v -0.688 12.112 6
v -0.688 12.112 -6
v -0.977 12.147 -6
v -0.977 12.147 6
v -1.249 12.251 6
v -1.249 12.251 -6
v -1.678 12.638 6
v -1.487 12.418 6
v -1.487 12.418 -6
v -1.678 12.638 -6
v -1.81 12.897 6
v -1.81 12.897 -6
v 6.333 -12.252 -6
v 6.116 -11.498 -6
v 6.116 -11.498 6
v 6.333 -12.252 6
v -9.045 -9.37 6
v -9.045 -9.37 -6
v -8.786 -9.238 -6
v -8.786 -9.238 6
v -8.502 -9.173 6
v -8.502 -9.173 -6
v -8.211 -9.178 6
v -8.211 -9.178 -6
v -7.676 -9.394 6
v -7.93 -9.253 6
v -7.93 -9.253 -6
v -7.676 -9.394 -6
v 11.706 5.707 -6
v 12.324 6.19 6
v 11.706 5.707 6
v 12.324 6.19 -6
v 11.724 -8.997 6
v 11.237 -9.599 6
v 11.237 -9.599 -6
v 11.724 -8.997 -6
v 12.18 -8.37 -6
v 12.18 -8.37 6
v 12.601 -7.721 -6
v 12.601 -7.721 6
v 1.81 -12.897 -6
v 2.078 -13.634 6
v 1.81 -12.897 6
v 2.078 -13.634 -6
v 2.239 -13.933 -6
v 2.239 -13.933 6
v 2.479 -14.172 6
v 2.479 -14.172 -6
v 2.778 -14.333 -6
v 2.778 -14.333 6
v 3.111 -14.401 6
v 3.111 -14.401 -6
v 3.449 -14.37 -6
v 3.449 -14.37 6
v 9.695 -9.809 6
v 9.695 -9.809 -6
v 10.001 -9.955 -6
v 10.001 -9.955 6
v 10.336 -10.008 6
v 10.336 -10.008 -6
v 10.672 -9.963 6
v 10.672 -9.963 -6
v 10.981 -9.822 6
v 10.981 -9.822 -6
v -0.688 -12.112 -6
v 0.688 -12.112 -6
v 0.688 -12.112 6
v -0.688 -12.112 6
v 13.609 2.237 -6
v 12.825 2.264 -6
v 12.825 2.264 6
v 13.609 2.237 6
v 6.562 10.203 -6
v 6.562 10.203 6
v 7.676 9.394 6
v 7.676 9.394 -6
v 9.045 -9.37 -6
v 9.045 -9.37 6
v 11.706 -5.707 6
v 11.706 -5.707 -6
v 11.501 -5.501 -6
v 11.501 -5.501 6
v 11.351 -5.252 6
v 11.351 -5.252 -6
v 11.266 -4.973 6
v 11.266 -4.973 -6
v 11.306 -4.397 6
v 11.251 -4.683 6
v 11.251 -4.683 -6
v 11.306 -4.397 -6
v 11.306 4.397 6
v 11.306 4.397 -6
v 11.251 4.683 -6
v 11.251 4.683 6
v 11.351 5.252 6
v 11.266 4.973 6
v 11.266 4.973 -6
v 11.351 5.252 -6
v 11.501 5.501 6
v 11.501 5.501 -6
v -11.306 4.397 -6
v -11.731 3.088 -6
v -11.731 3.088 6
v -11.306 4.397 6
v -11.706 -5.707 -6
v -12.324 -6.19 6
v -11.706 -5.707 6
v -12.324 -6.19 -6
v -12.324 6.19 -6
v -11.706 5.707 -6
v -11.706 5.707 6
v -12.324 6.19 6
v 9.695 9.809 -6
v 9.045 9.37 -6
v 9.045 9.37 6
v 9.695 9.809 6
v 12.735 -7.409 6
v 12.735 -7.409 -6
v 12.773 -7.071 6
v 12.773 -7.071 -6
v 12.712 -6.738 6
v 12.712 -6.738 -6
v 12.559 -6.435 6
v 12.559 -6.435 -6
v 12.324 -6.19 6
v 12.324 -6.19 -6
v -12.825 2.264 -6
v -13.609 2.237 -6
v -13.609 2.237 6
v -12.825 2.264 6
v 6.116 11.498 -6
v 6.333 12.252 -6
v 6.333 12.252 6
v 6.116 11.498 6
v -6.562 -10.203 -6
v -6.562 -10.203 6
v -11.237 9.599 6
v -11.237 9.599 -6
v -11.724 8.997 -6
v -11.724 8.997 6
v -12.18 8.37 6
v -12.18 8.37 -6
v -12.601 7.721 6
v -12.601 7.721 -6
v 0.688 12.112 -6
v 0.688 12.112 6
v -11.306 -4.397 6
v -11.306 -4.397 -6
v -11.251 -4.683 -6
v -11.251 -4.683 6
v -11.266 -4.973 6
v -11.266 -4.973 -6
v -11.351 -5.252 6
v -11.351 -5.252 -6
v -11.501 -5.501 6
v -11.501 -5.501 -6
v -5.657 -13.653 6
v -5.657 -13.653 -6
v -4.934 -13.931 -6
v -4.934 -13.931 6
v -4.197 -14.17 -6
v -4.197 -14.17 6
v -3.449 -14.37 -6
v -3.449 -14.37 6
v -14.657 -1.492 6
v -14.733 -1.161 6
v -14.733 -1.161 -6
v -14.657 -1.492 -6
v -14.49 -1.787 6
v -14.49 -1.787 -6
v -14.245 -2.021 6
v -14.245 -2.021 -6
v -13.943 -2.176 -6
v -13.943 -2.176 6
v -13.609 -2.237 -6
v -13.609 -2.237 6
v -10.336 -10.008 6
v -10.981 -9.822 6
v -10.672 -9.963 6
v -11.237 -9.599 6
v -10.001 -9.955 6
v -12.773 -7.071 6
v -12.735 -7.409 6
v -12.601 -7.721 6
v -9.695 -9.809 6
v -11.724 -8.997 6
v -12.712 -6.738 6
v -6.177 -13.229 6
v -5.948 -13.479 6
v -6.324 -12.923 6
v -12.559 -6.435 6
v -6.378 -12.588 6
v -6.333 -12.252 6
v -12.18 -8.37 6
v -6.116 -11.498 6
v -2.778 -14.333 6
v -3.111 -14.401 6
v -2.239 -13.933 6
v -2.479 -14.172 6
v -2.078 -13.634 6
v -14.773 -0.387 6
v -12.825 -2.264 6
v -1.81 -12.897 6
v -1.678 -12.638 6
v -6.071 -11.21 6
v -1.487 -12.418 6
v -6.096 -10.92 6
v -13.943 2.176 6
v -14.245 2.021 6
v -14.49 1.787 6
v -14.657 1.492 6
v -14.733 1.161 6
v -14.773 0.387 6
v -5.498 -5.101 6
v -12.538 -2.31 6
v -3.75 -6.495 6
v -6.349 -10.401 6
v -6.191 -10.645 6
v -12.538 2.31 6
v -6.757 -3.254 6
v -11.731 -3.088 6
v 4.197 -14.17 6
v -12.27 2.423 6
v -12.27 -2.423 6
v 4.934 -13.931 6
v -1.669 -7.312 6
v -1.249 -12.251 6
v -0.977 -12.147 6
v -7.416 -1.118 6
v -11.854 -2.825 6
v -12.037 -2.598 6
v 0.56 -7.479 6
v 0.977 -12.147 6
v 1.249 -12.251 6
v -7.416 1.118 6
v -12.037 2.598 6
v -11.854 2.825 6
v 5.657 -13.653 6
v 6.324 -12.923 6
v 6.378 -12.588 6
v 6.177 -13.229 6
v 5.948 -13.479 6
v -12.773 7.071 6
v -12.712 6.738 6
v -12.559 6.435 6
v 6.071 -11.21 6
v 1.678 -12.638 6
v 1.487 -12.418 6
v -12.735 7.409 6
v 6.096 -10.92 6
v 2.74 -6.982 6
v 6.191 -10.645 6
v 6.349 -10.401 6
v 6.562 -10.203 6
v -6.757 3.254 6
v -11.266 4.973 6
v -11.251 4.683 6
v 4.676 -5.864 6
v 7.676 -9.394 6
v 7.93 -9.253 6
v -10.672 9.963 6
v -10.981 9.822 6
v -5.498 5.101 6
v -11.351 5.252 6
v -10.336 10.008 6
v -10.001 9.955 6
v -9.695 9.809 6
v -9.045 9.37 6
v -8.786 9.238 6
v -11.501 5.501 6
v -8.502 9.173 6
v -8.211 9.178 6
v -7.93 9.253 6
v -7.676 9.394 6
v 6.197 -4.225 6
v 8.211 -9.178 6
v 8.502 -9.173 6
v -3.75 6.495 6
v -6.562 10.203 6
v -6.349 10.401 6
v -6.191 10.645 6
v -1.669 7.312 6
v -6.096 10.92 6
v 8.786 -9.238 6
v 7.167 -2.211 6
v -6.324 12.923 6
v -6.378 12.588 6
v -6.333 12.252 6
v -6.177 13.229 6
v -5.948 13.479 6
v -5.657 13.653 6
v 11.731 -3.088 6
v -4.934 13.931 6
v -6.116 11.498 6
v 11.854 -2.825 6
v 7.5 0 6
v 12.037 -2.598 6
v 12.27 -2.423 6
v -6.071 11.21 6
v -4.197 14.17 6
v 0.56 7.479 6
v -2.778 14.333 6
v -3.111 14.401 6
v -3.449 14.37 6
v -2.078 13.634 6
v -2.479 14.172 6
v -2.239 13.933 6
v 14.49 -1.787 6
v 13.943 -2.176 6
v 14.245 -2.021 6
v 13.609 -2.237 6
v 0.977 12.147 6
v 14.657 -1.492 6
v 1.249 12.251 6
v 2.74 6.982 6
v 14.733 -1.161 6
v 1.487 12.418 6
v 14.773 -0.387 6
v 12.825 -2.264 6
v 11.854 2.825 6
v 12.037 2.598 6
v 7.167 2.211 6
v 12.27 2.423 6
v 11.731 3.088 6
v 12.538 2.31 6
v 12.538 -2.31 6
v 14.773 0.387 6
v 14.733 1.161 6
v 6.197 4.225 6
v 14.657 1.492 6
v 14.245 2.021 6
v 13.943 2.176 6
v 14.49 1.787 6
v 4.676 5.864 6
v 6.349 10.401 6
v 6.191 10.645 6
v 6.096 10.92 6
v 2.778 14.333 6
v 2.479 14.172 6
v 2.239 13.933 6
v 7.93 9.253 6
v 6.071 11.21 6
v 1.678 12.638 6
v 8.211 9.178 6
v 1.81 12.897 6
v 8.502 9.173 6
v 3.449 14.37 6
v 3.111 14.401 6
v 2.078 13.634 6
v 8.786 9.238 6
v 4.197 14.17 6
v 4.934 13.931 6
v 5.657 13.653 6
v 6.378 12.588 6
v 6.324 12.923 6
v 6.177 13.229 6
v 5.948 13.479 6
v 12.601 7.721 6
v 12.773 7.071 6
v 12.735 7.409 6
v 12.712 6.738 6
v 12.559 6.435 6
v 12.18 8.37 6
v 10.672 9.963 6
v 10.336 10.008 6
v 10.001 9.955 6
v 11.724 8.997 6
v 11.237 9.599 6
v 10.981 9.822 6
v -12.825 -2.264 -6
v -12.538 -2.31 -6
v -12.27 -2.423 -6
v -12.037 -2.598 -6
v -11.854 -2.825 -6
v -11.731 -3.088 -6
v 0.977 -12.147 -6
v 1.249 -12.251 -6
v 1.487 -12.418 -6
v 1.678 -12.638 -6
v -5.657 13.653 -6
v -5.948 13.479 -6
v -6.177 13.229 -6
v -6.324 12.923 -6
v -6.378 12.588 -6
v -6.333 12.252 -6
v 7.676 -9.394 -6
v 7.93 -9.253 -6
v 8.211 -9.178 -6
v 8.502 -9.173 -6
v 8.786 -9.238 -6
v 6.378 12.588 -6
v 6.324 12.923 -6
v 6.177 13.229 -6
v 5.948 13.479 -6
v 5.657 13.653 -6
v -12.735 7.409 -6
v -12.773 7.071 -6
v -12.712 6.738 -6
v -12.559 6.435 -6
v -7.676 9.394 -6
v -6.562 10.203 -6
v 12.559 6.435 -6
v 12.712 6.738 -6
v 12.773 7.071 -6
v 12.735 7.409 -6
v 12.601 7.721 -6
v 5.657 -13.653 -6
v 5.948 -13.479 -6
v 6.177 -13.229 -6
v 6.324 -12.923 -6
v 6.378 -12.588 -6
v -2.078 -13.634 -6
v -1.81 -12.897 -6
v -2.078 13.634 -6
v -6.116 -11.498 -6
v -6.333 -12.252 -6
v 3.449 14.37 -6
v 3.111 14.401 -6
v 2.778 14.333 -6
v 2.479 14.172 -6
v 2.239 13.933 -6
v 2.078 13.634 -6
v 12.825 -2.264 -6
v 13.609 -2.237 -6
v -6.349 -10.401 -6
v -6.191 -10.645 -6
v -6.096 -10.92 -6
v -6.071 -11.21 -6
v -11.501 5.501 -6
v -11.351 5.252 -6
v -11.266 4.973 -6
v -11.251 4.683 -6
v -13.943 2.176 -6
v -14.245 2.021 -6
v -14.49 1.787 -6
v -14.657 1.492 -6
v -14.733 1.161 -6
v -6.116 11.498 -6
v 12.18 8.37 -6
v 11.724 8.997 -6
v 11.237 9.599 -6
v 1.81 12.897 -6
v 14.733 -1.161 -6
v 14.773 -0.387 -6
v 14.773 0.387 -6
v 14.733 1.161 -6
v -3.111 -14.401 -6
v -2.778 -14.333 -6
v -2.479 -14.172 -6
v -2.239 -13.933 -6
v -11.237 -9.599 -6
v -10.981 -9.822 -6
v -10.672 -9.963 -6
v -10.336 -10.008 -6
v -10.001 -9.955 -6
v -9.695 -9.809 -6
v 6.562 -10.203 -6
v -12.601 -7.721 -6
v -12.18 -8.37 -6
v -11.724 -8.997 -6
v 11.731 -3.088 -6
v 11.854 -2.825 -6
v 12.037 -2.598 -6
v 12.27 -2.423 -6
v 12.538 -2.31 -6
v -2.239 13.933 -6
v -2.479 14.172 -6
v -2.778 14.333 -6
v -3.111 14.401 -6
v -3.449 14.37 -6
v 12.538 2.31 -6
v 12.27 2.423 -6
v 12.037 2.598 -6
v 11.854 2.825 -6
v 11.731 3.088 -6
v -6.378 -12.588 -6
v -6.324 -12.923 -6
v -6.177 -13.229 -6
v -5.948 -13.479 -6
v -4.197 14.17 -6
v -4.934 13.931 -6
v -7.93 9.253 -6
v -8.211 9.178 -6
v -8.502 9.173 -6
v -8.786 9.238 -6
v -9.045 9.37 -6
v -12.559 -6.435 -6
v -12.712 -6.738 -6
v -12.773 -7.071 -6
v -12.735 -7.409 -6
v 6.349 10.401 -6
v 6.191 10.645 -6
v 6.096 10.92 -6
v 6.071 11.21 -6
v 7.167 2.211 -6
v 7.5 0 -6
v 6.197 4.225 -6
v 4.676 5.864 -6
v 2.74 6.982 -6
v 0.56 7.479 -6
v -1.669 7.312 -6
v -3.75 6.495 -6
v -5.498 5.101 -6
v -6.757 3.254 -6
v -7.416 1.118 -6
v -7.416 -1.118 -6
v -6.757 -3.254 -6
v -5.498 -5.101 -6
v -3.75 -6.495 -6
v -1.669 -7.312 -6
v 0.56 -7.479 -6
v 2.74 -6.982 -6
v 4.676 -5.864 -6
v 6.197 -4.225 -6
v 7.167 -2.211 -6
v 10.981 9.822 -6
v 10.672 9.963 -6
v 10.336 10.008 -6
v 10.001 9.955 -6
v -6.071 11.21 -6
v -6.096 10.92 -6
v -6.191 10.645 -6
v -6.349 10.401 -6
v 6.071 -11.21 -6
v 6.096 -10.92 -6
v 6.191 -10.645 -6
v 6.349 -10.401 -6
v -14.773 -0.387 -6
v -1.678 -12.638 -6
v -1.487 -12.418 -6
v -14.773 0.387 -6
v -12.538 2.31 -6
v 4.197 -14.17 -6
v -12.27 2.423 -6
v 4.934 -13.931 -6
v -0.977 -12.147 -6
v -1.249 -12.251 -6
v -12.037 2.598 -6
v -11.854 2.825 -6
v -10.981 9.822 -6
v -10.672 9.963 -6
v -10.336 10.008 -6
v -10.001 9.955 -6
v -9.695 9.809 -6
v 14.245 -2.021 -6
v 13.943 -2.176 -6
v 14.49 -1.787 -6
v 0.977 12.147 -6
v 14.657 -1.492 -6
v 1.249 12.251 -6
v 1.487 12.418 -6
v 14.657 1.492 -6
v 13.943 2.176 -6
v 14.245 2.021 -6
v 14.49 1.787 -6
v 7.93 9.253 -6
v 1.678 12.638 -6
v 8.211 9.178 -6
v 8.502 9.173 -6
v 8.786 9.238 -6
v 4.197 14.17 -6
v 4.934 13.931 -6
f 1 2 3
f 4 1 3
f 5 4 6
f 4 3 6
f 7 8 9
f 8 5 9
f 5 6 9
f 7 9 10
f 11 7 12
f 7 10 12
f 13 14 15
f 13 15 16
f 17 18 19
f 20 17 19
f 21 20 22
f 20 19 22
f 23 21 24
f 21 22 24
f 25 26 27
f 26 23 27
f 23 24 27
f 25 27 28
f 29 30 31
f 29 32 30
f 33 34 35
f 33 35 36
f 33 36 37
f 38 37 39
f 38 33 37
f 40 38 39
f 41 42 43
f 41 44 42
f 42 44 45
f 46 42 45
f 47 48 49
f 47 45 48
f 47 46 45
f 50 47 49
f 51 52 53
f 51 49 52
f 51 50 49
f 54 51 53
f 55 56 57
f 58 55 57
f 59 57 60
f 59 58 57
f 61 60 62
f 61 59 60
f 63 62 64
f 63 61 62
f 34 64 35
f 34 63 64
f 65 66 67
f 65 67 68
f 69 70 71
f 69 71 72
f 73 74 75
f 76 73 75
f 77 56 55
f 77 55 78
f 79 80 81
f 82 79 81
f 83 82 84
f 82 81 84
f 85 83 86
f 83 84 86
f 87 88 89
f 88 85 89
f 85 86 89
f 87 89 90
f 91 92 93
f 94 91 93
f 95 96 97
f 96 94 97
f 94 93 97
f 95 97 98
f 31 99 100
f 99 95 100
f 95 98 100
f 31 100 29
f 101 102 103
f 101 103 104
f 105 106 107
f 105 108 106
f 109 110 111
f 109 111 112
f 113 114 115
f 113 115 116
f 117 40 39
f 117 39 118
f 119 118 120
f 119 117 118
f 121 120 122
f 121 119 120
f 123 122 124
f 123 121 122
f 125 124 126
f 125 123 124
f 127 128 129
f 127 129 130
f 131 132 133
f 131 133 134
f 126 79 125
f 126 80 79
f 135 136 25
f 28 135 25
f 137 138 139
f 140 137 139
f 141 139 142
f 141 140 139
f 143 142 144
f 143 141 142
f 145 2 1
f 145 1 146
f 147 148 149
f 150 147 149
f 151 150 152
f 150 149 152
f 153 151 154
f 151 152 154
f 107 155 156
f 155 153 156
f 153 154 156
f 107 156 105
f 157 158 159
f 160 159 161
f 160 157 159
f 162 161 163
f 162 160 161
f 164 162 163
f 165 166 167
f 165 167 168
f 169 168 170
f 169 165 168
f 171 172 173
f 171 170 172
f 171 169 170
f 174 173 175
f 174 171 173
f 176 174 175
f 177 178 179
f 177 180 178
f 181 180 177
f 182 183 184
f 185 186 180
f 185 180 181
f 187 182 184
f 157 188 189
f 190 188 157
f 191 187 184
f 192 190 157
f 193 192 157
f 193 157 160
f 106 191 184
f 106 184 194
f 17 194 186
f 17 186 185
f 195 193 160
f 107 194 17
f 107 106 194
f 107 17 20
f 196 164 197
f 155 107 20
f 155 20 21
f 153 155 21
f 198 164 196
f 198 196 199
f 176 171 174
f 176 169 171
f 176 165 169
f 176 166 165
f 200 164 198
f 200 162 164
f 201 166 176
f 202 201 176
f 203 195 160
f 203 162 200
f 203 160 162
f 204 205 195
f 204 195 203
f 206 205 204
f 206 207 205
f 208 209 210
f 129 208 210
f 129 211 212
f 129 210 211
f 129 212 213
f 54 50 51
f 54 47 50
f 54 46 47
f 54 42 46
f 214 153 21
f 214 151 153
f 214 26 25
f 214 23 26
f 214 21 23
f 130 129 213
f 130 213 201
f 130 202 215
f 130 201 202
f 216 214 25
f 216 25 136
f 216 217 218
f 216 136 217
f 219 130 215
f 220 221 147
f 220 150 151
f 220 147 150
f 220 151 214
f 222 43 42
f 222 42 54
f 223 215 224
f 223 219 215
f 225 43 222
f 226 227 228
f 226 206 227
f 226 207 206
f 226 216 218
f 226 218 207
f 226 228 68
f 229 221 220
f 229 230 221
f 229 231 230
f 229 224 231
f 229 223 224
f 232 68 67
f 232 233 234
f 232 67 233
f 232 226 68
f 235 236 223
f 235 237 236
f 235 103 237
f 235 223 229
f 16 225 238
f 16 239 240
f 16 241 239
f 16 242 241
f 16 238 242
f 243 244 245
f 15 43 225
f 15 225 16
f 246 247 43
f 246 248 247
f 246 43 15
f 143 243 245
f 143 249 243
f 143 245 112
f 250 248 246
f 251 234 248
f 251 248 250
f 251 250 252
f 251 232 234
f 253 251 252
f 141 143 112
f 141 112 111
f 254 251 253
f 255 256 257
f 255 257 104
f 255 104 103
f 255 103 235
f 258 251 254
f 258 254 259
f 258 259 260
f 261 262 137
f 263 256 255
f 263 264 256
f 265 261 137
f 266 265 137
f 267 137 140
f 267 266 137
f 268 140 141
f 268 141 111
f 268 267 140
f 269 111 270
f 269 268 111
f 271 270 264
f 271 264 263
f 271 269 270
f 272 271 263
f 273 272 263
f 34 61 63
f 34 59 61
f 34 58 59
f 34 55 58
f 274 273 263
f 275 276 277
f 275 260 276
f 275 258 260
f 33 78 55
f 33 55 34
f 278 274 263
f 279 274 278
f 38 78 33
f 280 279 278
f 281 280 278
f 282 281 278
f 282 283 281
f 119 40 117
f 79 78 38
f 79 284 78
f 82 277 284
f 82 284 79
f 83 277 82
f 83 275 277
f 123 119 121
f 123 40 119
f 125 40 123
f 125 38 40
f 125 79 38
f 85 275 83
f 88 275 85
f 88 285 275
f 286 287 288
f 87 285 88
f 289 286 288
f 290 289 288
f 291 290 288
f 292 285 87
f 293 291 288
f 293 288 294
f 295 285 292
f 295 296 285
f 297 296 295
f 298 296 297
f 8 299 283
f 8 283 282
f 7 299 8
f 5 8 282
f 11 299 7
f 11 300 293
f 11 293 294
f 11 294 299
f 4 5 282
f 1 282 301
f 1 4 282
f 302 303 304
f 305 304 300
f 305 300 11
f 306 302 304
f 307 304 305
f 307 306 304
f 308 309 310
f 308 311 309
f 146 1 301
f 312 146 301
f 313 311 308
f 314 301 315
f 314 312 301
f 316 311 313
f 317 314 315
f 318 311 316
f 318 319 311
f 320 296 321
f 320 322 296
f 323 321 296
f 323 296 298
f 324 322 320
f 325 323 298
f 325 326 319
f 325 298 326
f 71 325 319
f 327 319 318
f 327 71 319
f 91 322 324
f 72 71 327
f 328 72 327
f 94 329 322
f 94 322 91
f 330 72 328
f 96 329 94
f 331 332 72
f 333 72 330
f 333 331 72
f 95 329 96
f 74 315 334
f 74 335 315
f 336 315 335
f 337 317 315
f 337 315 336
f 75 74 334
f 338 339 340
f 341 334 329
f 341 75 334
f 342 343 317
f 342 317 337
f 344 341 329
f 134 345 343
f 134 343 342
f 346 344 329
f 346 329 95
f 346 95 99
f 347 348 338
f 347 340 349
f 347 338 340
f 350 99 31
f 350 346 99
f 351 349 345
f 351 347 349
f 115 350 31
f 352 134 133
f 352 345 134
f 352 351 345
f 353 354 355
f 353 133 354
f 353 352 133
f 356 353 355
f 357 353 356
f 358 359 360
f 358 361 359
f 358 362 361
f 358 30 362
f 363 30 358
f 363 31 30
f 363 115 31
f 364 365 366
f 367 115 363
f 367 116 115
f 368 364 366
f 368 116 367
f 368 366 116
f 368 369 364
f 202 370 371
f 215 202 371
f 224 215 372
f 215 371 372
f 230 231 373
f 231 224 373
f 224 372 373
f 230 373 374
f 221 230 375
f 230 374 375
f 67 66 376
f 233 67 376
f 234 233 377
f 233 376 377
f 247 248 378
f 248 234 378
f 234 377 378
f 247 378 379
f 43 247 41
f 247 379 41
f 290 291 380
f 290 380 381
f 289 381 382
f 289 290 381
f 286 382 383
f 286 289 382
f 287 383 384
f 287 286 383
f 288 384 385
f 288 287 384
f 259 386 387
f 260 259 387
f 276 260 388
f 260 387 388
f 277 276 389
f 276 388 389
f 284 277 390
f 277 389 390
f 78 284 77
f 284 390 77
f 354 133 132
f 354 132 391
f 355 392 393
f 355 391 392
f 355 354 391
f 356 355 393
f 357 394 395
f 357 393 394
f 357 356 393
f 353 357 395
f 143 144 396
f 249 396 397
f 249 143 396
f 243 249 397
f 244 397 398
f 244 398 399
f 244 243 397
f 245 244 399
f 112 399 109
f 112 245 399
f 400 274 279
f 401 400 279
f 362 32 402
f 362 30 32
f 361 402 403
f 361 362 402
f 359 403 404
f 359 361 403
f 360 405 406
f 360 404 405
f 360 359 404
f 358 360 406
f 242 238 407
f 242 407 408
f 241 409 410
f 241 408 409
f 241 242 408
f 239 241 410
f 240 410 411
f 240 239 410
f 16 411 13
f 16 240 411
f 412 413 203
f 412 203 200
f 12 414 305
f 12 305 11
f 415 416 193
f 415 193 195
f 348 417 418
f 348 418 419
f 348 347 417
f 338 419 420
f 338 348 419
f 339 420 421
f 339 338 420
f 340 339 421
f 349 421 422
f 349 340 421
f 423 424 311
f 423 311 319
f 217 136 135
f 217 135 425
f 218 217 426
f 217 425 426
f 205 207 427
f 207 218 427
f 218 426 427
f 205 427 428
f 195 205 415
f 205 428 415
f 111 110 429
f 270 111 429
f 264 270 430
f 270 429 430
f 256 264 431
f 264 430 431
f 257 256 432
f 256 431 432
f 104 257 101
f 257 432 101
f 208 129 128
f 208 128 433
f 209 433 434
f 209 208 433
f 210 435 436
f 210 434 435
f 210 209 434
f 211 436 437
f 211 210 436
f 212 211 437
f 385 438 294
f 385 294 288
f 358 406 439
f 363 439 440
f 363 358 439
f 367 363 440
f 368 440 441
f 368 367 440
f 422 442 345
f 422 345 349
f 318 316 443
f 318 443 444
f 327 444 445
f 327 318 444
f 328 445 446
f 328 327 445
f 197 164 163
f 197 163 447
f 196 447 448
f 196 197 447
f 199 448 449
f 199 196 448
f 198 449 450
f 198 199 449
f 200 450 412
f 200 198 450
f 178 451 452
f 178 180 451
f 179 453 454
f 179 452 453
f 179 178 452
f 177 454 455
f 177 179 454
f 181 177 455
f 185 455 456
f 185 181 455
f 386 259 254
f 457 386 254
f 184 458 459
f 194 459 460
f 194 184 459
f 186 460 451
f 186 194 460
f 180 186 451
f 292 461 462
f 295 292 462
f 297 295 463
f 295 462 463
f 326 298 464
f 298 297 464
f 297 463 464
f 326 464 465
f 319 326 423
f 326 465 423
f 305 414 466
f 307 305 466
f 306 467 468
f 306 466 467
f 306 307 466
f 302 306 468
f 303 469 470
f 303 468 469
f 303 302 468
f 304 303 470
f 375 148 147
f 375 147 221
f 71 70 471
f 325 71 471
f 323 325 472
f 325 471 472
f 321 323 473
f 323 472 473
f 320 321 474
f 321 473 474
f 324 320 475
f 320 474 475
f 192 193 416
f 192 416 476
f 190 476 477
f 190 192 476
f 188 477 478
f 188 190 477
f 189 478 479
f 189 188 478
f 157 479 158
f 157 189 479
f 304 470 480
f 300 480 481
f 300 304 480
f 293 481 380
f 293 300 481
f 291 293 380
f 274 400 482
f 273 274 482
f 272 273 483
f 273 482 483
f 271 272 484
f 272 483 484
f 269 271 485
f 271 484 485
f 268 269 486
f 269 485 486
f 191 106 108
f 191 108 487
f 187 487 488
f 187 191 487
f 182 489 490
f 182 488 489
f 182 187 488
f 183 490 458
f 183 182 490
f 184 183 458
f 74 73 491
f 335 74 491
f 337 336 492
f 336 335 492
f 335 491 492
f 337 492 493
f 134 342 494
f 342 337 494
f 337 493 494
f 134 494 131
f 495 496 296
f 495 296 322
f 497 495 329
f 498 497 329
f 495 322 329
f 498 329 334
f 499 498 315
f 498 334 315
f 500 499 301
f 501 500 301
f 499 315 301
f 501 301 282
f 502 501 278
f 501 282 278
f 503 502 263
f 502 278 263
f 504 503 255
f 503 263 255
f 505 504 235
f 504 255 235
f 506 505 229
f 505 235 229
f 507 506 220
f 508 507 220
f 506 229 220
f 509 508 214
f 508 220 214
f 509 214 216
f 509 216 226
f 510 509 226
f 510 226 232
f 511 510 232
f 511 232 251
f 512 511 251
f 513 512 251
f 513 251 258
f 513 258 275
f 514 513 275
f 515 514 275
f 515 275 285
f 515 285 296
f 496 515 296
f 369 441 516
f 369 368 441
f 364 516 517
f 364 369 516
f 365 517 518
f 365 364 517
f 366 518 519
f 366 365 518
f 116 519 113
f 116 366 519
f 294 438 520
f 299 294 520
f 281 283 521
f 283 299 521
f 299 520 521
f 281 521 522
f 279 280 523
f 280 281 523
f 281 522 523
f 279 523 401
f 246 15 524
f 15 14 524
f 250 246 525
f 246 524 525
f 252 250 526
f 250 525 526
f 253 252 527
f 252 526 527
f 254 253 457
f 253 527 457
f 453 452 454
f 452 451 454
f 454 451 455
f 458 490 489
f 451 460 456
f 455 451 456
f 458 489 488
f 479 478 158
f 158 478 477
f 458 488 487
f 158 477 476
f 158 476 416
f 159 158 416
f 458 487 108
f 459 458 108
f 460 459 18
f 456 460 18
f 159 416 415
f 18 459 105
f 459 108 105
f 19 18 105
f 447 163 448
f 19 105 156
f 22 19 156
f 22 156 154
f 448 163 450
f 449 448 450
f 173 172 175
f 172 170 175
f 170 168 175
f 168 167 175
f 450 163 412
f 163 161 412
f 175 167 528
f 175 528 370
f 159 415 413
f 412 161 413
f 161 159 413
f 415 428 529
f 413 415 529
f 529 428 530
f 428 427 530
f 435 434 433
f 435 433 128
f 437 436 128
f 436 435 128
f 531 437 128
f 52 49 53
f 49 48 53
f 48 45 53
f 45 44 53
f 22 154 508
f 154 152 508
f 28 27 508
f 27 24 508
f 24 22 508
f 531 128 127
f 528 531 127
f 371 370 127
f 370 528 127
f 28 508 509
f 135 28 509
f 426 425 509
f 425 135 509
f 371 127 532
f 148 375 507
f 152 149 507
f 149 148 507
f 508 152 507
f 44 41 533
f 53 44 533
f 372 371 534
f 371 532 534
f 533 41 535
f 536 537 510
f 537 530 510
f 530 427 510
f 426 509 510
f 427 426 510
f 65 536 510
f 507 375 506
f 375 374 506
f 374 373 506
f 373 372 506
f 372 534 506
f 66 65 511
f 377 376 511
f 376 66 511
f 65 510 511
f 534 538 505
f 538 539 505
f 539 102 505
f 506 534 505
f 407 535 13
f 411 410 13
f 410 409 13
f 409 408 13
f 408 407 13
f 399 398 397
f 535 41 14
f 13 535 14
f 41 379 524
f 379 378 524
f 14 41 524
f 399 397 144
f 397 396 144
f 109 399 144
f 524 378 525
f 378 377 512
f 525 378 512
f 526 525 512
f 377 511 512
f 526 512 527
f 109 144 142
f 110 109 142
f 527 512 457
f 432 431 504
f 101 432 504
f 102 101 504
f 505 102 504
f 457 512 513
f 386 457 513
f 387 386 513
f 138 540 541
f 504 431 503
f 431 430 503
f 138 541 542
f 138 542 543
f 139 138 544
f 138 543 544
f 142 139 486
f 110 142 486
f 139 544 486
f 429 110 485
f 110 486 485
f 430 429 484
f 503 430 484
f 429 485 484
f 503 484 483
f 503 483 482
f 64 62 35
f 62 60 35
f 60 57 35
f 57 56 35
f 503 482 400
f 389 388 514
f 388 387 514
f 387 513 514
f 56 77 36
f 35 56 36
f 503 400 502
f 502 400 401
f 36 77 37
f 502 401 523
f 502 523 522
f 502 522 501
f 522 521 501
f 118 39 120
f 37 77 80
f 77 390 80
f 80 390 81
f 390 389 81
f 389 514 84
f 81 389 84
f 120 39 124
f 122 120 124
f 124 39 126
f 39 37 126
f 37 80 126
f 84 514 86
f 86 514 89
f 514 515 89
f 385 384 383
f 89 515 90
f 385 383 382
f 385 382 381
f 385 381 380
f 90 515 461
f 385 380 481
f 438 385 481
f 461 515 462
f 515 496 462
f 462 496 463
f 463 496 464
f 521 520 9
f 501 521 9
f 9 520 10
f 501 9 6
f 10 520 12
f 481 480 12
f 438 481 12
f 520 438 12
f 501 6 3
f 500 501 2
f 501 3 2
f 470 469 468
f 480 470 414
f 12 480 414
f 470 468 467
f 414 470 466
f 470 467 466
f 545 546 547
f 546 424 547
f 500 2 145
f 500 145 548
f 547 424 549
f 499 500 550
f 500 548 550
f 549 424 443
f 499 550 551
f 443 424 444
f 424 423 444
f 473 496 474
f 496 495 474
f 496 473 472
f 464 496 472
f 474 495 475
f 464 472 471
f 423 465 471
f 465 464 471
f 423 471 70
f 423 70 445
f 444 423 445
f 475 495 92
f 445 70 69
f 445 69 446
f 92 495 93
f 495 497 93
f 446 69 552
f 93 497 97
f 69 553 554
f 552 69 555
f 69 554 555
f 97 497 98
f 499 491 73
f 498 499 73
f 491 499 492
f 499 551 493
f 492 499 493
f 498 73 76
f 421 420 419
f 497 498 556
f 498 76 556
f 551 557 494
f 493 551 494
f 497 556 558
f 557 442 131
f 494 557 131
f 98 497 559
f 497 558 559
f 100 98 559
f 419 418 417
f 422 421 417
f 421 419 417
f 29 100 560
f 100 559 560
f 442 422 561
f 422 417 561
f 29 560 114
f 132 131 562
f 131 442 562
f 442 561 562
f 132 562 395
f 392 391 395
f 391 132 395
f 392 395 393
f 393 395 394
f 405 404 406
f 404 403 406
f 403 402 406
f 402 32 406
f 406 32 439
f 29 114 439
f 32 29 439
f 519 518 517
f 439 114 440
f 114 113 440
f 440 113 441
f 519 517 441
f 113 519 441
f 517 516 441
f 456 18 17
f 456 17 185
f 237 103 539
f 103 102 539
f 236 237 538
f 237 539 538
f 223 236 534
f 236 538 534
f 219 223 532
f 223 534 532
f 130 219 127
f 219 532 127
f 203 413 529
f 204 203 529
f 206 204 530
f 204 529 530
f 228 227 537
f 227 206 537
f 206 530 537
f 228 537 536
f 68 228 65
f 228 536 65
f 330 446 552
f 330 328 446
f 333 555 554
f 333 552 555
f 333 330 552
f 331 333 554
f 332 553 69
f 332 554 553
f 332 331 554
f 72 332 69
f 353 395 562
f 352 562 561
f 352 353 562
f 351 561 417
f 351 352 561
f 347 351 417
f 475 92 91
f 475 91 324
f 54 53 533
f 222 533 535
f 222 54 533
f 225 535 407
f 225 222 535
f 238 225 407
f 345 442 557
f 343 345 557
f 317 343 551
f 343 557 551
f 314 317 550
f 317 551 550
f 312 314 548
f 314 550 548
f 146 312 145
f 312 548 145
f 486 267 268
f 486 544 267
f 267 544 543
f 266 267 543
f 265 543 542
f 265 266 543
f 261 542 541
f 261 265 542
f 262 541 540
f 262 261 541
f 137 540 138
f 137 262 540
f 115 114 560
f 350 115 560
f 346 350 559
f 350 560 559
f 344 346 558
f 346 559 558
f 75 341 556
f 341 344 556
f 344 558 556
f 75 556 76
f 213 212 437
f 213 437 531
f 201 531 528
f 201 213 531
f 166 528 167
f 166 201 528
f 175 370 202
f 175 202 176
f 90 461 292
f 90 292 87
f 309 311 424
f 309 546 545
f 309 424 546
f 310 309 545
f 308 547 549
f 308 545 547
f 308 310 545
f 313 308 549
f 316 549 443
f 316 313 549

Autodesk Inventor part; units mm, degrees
ref_plane "YZ Plane" through (0, 0, 0) normal (1, 0, 0) x (0, 1, 0)
ref_plane "XZ Plane" through (0, 0, 0) normal (0, 1, 0) x (-1, 0, 0)
ref_plane "XY Plane" through (0, 0, 0) normal (0, 0, 1) x (1, 0, 0)
sketch "Pulley Sketch" plane through (0, 0, 0) normal (0, 0, 1) x (1, 0, 0)
  circle A0 centre (0, 0) radius 15.1595 construction
  circle A1 centre (0, 0) radius 14.7785
  circle A2 centre (0, 0) radius 12.1115
  line L0 (-2.422, 14.5787) -> (-1.524, 12.1115)
  line L1 (-1.524, 12.1115) -> (1.524, 12.1115)
  line L2 (1.524, 12.1115) -> (2.422, 14.5787)
  line L3 (0, 0) -> (0, 14.7785) construction
  point P0 (0, 12.1115)
  dimension "d0" = 30.319
  dimension "d1" = 0.381
  dimension "d2" = 2.667
  dimension "d3" = 40
  dimension "d4" = 3.048
extrude "Base Body" add sketch "Pulley Sketch" along normal mid plane 12 contours A2 | A1 L0 L1 L2 | L2 L1 L0 A1
extrude "Tooth" cut sketch "Pulley Sketch" along normal through all both and the other way through all contours L2 L1 L0 A1 picked at (0, 13.8747)
fillet "Tooth Fillet" radius 1.1938 2 edges at (1.524, 12.1115, 0) (-1.524, 12.1115, 0)
fillet "Tooth Fillet" radius 1.1684 4 edges at (-2.422, 14.5787, 3) (-2.422, 14.5787, -3) (2.422, 14.5787, 3) (2.422, 14.5787, -3)
pattern_circular "Teeth" count 10 over 360 about axis through (0, 0, -10) along (0, 0, 1) of "Tooth", "Tooth Fillet"
feature "Left flange" [suppressed]
feature "Right flange" [suppressed]
sketch "Sketch2" plane through (0, 0, 6) normal (0, 0, 1) x (1, 0, 0)
  circle A0 centre (0, 0) radius 7.5
  dimension "d17" = 15
extrude "Extrusion3" cut sketch "Sketch2" against normal through all
equation "\"d1\" = da_a"
equation "\"d2\" = da_hg"
equation "\"d3\" = 2 * da_fi"
equation "\"d4\" = da_bw"
equation "\"d5\" = da_bf"
equation "\"d7\" = da_bf"
equation "\"d9\" = da_rb"
equation "\"d10\" = da_rt"
equation "\"da_pb\" = 9.525"
equation "\"da_fi\" = 20deg"
equation "\"da_hg\" = 2.667"
equation "\"da_bw\" = 3.048"
equation "\"da_rb\" = 1.1938"
equation "\"da_rt\" = 1.1684"
equation "\"da_a\" = 0.381"
equation "\"da_bf\" = 12"
equation "\"da_wf\" = 1.5"
equation "\"da_hf\" = 1.5"
properties part number "Synchronous Pulley1" material "Steel"
